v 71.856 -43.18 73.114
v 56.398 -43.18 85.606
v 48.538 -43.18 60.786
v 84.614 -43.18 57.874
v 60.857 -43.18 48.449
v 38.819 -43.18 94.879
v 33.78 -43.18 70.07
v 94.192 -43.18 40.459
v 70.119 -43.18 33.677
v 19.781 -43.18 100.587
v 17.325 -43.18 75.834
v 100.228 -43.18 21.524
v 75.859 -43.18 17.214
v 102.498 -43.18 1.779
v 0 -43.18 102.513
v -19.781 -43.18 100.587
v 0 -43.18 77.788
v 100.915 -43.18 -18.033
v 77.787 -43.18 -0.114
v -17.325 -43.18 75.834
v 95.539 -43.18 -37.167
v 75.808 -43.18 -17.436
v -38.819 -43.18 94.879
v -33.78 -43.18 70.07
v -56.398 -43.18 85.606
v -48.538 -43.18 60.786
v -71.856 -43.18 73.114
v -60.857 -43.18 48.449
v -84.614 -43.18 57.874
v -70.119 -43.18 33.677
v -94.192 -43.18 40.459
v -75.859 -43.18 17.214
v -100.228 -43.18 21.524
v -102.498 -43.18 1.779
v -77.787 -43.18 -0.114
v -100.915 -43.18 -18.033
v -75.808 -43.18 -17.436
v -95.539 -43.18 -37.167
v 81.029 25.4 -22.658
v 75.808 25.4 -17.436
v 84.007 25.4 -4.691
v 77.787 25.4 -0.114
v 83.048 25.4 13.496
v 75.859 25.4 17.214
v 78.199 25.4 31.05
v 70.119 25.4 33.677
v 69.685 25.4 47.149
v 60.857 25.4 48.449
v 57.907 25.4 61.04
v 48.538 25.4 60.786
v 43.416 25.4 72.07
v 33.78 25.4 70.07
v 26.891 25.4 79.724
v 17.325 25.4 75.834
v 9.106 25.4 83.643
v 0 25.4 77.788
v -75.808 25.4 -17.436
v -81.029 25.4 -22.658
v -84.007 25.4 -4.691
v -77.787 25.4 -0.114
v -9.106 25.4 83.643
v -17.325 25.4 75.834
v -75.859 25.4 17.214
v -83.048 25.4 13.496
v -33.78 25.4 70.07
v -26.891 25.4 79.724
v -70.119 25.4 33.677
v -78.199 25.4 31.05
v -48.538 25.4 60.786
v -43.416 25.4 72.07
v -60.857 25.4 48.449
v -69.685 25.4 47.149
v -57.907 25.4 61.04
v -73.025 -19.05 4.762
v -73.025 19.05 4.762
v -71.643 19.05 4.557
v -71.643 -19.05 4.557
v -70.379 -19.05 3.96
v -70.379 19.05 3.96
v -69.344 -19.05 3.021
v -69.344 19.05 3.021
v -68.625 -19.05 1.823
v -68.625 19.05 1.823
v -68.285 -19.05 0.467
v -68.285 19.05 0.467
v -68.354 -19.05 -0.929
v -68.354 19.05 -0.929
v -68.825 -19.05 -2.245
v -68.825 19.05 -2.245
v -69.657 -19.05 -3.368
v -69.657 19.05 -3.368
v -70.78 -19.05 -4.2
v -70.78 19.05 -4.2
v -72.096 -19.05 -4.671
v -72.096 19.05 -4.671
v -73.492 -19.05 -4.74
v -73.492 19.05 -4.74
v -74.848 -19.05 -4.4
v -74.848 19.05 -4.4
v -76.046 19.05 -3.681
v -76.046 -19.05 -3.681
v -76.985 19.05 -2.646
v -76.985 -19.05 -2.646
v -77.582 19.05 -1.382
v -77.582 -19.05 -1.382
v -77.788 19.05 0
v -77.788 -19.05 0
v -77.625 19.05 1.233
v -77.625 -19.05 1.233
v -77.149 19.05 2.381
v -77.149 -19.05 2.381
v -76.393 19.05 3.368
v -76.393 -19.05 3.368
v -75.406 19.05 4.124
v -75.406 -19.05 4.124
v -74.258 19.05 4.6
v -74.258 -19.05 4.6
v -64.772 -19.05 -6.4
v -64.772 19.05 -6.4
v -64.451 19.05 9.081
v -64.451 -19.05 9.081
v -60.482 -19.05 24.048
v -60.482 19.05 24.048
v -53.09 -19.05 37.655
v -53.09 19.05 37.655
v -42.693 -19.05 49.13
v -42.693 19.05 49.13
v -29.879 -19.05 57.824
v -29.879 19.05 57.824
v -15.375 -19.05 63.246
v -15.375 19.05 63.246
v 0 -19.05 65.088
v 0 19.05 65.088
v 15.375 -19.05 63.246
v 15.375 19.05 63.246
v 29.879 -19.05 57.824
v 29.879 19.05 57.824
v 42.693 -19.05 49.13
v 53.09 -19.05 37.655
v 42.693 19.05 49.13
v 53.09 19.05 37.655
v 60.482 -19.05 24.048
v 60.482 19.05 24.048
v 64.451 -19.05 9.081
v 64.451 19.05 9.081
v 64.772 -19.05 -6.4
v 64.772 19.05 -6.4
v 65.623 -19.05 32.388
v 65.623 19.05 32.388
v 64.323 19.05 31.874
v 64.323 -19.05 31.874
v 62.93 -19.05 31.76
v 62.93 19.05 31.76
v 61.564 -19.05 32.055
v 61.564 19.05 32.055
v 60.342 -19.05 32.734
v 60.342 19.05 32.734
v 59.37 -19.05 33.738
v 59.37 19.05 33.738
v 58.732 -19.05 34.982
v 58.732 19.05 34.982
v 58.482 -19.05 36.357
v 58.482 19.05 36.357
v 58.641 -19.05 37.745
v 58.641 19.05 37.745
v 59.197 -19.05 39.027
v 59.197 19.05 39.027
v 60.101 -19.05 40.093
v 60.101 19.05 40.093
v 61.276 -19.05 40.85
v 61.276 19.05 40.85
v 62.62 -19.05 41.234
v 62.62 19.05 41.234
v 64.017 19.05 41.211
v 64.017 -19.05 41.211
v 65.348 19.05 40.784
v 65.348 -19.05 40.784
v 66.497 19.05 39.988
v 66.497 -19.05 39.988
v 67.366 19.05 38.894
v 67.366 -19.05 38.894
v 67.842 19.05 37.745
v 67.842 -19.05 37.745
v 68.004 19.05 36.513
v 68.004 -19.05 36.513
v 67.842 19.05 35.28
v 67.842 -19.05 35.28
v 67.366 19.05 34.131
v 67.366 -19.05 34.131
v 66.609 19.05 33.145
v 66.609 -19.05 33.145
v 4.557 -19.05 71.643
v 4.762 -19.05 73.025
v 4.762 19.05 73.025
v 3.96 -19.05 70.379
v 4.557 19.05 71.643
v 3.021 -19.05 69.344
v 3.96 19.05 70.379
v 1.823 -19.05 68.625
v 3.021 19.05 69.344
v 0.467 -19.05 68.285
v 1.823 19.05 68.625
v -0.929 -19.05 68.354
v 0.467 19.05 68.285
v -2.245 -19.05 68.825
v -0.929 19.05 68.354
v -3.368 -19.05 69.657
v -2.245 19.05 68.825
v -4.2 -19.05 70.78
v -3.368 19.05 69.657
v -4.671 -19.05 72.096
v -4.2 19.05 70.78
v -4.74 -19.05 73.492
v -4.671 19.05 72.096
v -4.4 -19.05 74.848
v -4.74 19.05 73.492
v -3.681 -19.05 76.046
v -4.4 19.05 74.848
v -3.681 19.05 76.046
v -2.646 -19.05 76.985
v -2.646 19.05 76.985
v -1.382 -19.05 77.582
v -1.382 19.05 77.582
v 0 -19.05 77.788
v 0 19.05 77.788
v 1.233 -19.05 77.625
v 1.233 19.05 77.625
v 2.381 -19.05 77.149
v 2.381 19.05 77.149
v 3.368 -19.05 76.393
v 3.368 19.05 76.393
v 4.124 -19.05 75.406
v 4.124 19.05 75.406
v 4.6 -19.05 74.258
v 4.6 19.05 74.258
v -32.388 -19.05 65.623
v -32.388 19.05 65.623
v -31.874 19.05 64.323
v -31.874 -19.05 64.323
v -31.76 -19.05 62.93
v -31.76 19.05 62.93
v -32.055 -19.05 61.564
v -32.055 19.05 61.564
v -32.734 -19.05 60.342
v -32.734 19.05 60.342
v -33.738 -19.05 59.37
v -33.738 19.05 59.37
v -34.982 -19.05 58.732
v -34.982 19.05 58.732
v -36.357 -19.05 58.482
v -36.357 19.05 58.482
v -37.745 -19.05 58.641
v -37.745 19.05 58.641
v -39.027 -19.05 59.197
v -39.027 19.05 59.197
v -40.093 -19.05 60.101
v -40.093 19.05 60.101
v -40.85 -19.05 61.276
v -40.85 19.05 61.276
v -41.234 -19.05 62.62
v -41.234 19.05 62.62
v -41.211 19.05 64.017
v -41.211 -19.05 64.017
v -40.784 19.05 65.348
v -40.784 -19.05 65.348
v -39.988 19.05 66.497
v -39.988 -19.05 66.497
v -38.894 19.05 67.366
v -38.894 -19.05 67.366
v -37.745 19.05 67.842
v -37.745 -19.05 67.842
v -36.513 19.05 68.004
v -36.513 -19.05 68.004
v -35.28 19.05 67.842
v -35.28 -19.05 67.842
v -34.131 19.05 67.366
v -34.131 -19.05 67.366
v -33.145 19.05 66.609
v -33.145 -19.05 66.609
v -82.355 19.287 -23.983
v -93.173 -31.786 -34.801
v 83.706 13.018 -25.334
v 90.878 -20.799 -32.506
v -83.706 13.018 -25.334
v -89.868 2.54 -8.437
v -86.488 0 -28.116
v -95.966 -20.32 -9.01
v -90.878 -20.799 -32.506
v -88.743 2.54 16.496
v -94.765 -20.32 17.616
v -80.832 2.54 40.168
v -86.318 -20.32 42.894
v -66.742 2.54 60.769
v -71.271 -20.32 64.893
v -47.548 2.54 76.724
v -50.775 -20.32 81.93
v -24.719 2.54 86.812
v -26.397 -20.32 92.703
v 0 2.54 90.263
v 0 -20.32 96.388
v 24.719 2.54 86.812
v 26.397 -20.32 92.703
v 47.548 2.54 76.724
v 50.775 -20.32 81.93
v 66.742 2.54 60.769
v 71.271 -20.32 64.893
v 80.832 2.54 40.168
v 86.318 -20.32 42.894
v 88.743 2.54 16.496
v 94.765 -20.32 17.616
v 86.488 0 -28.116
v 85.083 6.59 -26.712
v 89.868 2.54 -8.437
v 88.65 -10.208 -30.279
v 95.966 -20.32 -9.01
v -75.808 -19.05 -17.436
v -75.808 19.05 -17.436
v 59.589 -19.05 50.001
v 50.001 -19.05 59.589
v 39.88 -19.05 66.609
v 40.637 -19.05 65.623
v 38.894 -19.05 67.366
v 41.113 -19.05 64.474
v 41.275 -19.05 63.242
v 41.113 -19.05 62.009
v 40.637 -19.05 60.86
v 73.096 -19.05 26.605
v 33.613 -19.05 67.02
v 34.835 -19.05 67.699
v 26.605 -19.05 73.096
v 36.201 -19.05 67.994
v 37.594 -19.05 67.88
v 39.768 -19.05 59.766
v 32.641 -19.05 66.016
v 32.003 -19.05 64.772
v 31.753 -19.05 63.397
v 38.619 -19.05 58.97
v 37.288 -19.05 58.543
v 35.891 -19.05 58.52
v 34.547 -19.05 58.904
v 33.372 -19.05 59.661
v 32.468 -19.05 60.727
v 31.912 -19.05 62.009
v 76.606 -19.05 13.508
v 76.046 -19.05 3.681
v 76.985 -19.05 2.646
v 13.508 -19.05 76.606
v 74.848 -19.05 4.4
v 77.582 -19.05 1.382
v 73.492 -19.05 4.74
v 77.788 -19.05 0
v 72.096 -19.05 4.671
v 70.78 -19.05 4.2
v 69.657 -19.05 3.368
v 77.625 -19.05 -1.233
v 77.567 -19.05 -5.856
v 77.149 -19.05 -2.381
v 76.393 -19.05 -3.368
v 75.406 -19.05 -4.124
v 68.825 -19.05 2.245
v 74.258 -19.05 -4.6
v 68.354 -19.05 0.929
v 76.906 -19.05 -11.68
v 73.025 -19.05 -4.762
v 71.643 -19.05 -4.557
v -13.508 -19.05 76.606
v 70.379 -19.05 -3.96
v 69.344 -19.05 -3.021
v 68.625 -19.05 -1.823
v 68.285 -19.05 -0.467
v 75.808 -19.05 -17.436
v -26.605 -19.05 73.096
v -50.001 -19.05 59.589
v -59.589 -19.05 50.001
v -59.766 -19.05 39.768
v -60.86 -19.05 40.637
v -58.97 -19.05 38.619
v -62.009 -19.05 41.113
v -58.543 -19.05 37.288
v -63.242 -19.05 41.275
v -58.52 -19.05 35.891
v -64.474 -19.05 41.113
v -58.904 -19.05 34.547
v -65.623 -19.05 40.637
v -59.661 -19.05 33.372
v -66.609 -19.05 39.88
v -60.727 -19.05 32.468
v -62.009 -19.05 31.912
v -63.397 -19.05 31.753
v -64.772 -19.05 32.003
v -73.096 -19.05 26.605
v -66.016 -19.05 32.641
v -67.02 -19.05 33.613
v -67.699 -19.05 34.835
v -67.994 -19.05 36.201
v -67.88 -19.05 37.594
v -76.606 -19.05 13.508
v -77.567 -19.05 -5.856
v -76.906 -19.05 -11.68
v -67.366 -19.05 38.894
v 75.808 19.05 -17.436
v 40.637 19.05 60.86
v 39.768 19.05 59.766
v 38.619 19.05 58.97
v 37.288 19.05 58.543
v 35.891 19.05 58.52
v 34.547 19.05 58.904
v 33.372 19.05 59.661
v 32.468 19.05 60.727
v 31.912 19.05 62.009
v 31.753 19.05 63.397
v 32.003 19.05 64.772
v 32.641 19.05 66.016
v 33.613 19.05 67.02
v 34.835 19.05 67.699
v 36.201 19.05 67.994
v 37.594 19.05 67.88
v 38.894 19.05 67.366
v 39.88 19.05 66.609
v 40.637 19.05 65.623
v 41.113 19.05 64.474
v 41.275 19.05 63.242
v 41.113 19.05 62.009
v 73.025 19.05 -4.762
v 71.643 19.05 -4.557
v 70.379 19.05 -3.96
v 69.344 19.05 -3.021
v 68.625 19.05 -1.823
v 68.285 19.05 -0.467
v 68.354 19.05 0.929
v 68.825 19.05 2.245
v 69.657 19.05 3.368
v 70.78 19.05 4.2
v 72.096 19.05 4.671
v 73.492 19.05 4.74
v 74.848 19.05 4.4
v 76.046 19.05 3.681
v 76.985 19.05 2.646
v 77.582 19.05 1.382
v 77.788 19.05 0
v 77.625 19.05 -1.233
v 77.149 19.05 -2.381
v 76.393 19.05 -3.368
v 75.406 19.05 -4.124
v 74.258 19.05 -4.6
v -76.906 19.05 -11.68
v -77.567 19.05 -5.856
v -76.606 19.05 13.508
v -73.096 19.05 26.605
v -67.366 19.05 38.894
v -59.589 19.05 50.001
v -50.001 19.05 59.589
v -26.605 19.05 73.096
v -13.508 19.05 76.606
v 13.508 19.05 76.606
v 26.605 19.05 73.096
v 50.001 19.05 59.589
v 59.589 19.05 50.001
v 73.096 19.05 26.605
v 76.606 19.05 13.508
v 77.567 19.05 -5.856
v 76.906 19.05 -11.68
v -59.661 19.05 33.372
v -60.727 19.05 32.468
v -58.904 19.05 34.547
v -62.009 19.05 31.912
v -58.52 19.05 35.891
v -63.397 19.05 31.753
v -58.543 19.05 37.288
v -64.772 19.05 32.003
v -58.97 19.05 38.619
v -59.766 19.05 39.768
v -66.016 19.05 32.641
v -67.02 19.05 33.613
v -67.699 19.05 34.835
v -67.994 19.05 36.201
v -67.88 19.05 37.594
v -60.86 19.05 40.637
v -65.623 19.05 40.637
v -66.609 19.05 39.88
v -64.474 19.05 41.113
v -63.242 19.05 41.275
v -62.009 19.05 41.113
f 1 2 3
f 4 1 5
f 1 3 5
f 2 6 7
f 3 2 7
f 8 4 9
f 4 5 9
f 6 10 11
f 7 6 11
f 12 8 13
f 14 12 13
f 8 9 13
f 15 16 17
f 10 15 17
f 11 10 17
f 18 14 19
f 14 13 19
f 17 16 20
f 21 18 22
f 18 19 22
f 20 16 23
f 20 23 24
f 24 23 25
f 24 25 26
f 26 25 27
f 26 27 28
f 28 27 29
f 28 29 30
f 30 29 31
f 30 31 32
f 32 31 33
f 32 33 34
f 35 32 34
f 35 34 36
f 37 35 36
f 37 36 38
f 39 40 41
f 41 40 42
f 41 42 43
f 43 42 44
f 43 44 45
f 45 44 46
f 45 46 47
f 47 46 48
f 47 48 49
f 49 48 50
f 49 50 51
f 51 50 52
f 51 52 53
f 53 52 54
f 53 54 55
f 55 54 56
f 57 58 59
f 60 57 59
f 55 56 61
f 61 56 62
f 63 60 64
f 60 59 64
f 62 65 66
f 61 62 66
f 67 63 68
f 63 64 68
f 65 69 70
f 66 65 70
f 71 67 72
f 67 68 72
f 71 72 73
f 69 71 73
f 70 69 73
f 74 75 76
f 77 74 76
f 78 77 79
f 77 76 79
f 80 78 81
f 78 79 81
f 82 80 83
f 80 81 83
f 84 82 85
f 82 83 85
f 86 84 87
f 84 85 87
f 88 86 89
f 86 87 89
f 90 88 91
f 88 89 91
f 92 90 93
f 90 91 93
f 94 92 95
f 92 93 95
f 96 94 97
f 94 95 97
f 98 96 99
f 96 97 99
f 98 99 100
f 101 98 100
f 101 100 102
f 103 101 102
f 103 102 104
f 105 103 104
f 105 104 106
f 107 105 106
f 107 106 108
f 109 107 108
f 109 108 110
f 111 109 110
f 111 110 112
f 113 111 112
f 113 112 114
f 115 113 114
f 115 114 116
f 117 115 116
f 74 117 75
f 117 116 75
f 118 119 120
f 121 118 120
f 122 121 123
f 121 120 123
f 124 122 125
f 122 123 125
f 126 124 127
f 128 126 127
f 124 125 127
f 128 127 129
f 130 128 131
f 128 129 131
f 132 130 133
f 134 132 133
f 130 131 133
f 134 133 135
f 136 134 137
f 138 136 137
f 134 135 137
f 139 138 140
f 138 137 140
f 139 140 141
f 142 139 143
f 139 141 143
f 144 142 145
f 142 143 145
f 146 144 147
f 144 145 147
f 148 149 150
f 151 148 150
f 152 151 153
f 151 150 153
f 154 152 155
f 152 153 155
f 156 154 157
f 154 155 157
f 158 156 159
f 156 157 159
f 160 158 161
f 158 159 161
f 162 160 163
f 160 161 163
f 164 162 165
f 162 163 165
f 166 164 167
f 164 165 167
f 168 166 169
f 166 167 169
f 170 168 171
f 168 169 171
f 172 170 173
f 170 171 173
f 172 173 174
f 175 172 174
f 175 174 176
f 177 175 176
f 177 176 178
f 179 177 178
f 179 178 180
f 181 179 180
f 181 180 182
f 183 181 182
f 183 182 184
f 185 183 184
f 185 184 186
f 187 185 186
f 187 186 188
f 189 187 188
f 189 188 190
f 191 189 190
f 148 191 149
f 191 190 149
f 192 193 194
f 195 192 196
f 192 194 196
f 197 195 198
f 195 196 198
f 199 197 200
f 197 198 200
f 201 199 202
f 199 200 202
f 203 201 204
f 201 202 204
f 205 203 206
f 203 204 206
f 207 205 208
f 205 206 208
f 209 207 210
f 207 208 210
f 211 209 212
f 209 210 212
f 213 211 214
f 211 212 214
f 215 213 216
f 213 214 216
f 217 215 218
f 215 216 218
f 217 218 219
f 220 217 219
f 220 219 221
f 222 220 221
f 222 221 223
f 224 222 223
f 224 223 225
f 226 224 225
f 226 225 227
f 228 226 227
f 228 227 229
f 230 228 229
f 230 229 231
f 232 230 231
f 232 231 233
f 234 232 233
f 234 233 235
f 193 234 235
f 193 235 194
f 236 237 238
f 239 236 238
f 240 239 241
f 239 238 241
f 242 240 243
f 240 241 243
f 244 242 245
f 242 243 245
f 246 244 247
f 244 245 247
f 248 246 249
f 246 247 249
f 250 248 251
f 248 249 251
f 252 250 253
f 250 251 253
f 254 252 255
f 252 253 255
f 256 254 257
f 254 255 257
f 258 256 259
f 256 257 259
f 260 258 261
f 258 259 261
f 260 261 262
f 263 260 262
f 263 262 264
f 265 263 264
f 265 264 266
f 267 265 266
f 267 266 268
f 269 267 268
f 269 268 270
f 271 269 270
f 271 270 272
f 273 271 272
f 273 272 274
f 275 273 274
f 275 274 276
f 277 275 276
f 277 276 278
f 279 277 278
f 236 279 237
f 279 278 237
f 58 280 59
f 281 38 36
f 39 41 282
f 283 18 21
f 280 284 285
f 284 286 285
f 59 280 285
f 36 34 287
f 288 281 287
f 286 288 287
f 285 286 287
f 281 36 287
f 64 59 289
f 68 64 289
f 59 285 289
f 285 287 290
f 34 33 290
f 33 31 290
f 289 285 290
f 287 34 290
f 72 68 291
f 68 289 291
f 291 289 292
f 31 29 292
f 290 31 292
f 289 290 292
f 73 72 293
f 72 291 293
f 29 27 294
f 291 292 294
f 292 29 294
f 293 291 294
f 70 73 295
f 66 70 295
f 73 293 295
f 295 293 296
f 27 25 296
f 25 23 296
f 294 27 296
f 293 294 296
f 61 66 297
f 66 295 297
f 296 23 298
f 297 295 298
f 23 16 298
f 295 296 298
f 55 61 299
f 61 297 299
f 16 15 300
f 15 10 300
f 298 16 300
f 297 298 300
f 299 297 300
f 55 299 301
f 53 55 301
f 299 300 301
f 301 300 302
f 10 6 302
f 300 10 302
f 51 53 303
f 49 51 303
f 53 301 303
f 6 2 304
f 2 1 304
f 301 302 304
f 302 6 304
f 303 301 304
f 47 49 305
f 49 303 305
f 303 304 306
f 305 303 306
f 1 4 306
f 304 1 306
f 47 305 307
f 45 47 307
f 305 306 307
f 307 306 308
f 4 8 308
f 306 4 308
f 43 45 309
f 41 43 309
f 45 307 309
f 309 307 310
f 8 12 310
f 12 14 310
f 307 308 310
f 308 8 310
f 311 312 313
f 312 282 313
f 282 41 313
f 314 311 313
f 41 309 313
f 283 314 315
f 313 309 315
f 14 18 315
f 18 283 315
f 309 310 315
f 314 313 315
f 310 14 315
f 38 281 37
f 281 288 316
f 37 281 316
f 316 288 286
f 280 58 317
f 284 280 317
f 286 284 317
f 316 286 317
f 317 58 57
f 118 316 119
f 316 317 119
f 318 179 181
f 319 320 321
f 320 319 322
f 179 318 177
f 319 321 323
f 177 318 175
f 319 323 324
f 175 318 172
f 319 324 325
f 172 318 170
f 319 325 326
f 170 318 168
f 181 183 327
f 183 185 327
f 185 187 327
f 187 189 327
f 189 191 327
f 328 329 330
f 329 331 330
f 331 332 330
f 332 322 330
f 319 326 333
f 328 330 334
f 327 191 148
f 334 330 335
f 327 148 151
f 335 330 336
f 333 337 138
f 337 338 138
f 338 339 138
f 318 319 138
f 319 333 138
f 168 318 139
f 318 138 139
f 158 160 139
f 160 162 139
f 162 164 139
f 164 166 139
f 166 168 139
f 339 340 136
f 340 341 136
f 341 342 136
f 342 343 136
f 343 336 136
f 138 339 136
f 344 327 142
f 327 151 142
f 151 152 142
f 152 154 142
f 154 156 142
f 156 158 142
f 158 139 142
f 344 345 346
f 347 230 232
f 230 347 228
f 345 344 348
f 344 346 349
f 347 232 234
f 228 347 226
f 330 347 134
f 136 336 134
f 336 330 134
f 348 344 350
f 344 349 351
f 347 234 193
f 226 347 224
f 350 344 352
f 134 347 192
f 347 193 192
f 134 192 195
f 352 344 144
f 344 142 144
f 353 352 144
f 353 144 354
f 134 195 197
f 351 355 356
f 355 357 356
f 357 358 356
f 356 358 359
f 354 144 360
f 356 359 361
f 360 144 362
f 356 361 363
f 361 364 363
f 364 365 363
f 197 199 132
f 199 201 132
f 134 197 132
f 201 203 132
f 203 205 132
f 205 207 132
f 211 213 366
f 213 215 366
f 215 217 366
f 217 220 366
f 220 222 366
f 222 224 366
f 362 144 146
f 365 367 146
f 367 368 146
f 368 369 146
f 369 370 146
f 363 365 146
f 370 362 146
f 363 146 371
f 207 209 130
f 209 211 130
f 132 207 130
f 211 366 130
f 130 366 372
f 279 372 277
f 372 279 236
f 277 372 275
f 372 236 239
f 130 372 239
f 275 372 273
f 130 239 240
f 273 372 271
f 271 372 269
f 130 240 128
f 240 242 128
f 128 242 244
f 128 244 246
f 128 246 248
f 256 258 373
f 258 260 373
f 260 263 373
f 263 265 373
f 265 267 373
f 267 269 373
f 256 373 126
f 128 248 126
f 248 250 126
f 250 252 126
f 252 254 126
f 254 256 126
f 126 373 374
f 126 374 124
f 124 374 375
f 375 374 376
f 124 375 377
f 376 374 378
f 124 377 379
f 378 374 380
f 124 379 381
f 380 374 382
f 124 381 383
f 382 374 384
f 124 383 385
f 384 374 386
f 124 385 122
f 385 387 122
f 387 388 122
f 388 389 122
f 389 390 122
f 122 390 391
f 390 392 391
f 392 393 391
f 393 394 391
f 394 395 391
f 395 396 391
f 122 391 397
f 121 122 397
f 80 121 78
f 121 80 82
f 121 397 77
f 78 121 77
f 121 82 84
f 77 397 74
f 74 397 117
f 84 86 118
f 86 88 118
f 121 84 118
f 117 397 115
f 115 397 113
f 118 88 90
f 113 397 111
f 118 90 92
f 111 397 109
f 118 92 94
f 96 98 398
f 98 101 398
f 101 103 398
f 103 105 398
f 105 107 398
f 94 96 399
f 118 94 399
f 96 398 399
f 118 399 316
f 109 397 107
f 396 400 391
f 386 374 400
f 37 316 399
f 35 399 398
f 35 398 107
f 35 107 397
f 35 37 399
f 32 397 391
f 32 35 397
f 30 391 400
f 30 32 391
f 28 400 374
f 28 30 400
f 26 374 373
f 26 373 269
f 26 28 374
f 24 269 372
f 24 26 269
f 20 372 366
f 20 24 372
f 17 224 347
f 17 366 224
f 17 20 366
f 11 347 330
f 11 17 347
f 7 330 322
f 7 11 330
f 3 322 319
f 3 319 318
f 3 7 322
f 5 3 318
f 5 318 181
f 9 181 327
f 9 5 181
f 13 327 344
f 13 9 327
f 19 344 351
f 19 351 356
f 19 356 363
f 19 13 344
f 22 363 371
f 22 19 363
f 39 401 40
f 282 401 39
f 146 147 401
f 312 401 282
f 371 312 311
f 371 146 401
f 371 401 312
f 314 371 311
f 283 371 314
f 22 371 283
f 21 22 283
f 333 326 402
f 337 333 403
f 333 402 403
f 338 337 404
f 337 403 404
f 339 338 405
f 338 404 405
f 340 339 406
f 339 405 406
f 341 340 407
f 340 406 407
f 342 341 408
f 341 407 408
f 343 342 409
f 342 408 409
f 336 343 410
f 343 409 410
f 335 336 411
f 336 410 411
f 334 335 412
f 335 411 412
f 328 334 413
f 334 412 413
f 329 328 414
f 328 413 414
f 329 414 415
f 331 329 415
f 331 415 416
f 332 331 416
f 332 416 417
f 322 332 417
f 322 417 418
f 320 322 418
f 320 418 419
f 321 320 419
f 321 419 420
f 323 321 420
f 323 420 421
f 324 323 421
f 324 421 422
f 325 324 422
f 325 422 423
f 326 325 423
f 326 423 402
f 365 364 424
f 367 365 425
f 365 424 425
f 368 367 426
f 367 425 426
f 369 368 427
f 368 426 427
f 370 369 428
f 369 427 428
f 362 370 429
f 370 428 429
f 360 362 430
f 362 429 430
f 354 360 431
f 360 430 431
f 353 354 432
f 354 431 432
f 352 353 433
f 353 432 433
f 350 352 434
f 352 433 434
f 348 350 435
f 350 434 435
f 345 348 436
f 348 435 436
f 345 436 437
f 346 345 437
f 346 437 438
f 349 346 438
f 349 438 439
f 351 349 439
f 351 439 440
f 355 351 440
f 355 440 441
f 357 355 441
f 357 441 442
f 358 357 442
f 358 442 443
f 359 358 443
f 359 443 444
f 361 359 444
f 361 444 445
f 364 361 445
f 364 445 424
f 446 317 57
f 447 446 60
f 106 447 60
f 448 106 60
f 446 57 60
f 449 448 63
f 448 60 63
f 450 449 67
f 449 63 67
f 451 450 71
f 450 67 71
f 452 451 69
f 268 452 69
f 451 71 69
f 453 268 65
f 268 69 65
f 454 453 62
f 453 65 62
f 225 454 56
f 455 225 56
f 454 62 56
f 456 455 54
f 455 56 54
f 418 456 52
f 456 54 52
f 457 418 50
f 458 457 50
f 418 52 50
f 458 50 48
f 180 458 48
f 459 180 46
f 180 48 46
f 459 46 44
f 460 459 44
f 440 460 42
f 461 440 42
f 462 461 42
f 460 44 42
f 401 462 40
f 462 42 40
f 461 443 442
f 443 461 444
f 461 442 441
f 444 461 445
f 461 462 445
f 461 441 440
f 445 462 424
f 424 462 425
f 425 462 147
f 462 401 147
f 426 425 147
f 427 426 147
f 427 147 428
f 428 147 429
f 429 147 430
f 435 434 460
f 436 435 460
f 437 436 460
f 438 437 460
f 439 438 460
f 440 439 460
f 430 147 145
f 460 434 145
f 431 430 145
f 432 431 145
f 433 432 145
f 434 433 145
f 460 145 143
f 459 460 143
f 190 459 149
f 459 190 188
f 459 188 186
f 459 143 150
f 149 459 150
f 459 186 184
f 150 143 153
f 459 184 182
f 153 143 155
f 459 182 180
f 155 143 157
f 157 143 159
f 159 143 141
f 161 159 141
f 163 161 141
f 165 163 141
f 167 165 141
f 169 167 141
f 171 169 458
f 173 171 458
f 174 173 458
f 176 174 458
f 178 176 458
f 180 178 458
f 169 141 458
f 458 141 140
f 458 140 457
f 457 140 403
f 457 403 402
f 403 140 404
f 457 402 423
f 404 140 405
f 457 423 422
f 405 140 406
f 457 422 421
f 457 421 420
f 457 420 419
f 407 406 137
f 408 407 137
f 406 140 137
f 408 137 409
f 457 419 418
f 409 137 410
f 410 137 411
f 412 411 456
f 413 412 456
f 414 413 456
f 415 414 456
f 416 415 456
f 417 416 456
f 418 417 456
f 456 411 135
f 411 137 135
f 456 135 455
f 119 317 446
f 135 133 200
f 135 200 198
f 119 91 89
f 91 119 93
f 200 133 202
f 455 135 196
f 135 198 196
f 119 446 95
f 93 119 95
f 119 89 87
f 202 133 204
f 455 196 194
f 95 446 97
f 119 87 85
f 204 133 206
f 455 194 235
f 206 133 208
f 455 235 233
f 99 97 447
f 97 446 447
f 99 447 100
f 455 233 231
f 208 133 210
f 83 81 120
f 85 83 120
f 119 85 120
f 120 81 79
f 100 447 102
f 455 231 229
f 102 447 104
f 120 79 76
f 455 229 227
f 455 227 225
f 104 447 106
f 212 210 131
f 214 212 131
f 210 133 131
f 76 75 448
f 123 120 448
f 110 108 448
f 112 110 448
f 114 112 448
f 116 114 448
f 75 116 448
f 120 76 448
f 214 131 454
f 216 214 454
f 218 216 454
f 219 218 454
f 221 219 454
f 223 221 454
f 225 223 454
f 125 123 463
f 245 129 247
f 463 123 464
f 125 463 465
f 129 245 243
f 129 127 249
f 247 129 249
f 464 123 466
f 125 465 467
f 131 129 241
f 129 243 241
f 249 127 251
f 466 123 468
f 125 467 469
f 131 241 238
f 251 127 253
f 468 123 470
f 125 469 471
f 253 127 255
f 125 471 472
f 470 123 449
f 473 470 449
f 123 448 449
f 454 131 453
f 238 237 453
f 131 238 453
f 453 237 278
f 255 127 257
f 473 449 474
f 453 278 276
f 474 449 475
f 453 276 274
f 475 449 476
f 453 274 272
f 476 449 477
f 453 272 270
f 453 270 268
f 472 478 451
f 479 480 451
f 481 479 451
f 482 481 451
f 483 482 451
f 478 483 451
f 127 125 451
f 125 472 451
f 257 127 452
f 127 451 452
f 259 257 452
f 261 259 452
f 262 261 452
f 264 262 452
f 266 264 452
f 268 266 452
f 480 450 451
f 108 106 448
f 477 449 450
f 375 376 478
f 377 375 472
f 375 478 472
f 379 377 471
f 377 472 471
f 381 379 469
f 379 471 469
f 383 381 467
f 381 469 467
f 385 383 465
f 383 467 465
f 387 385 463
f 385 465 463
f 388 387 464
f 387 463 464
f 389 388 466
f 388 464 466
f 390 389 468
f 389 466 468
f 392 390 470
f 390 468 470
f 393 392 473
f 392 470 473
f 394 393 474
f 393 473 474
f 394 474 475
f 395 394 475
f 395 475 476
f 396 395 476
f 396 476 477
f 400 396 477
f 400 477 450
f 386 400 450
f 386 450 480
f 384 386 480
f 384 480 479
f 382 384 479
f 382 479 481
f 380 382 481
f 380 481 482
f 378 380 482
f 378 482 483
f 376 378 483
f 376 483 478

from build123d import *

# Parameters (mm, degrees)
SKETCH2_R               = 4.7625
CUT_EXTRUDE1_DEPTH      = 63.23
CIRPATTERN1_COUNT       = 12
CUT_EXTRUDE2_DEPTH      = 26.4
CUT_EXTRUDE2_DEPTH_BACK = 44.18


with BuildPart() as part:
    # Sketch1 → Revolve1 (revolve)
    with BuildSketch(Plane(origin=(0, 0, 0), x_dir=(0, 0, -1), z_dir=(1, 0, 0))):
        Polygon((65.0875, -19.05), (65.0875, 19.05), (77.7875, 19.05), (77.7875, 25.4), (84.1375, 25.4), (102.513455617, -43.18), (77.7875, -43.18), (77.7875, -25.4), (77.7875, -19.05), align=None)
    revolve(axis=Axis((0, -44.45, 0), (0, 1, 0)))

    # Sketch2 → Cut-Extrude1 (cut, through all)
    with BuildSketch(Plane(origin=(0, 19.05, 0), x_dir=(1, 0, 0), z_dir=(0, 1, 0))):
        with Locations((0, -73.025)):
            Circle(SKETCH2_R)
    cut_extrude1 = extrude(amount=-CUT_EXTRUDE1_DEPTH, mode=Mode.SUBTRACT)

    # CirPattern1: Cut-Extrude1 ×12 about axis
    cirpattern1_axis = Axis((0, 0, 0), (0, 1, 0))
    for i in range(1, CIRPATTERN1_COUNT):
        add(cut_extrude1.rotate(cirpattern1_axis, i * 360 / CIRPATTERN1_COUNT), mode=Mode.SUBTRACT)

    # Sketch3 → Cut-Extrude2 (cut, two sides)
    with BuildSketch(Plane(origin=(0, 0, 0), x_dir=(1, 0, 0), z_dir=(0, 1, 0))) as cut_extrude2_sk:
        with BuildLine():
            Line((0, -58.371664787), (95.538612884, 37.166948097))
            ThreePointArc((95.538612884, 37.166948097), (0, 102.513455617), (-95.538612884, 37.166948097))
            Line((-95.538612884, 37.166948097), (0, -58.371664787))
        make_face()
    extrude(amount=CUT_EXTRUDE2_DEPTH, mode=Mode.SUBTRACT)
    extrude(cut_extrude2_sk.sketch, amount=-CUT_EXTRUDE2_DEPTH_BACK, mode=Mode.SUBTRACT)


solid = part.part
